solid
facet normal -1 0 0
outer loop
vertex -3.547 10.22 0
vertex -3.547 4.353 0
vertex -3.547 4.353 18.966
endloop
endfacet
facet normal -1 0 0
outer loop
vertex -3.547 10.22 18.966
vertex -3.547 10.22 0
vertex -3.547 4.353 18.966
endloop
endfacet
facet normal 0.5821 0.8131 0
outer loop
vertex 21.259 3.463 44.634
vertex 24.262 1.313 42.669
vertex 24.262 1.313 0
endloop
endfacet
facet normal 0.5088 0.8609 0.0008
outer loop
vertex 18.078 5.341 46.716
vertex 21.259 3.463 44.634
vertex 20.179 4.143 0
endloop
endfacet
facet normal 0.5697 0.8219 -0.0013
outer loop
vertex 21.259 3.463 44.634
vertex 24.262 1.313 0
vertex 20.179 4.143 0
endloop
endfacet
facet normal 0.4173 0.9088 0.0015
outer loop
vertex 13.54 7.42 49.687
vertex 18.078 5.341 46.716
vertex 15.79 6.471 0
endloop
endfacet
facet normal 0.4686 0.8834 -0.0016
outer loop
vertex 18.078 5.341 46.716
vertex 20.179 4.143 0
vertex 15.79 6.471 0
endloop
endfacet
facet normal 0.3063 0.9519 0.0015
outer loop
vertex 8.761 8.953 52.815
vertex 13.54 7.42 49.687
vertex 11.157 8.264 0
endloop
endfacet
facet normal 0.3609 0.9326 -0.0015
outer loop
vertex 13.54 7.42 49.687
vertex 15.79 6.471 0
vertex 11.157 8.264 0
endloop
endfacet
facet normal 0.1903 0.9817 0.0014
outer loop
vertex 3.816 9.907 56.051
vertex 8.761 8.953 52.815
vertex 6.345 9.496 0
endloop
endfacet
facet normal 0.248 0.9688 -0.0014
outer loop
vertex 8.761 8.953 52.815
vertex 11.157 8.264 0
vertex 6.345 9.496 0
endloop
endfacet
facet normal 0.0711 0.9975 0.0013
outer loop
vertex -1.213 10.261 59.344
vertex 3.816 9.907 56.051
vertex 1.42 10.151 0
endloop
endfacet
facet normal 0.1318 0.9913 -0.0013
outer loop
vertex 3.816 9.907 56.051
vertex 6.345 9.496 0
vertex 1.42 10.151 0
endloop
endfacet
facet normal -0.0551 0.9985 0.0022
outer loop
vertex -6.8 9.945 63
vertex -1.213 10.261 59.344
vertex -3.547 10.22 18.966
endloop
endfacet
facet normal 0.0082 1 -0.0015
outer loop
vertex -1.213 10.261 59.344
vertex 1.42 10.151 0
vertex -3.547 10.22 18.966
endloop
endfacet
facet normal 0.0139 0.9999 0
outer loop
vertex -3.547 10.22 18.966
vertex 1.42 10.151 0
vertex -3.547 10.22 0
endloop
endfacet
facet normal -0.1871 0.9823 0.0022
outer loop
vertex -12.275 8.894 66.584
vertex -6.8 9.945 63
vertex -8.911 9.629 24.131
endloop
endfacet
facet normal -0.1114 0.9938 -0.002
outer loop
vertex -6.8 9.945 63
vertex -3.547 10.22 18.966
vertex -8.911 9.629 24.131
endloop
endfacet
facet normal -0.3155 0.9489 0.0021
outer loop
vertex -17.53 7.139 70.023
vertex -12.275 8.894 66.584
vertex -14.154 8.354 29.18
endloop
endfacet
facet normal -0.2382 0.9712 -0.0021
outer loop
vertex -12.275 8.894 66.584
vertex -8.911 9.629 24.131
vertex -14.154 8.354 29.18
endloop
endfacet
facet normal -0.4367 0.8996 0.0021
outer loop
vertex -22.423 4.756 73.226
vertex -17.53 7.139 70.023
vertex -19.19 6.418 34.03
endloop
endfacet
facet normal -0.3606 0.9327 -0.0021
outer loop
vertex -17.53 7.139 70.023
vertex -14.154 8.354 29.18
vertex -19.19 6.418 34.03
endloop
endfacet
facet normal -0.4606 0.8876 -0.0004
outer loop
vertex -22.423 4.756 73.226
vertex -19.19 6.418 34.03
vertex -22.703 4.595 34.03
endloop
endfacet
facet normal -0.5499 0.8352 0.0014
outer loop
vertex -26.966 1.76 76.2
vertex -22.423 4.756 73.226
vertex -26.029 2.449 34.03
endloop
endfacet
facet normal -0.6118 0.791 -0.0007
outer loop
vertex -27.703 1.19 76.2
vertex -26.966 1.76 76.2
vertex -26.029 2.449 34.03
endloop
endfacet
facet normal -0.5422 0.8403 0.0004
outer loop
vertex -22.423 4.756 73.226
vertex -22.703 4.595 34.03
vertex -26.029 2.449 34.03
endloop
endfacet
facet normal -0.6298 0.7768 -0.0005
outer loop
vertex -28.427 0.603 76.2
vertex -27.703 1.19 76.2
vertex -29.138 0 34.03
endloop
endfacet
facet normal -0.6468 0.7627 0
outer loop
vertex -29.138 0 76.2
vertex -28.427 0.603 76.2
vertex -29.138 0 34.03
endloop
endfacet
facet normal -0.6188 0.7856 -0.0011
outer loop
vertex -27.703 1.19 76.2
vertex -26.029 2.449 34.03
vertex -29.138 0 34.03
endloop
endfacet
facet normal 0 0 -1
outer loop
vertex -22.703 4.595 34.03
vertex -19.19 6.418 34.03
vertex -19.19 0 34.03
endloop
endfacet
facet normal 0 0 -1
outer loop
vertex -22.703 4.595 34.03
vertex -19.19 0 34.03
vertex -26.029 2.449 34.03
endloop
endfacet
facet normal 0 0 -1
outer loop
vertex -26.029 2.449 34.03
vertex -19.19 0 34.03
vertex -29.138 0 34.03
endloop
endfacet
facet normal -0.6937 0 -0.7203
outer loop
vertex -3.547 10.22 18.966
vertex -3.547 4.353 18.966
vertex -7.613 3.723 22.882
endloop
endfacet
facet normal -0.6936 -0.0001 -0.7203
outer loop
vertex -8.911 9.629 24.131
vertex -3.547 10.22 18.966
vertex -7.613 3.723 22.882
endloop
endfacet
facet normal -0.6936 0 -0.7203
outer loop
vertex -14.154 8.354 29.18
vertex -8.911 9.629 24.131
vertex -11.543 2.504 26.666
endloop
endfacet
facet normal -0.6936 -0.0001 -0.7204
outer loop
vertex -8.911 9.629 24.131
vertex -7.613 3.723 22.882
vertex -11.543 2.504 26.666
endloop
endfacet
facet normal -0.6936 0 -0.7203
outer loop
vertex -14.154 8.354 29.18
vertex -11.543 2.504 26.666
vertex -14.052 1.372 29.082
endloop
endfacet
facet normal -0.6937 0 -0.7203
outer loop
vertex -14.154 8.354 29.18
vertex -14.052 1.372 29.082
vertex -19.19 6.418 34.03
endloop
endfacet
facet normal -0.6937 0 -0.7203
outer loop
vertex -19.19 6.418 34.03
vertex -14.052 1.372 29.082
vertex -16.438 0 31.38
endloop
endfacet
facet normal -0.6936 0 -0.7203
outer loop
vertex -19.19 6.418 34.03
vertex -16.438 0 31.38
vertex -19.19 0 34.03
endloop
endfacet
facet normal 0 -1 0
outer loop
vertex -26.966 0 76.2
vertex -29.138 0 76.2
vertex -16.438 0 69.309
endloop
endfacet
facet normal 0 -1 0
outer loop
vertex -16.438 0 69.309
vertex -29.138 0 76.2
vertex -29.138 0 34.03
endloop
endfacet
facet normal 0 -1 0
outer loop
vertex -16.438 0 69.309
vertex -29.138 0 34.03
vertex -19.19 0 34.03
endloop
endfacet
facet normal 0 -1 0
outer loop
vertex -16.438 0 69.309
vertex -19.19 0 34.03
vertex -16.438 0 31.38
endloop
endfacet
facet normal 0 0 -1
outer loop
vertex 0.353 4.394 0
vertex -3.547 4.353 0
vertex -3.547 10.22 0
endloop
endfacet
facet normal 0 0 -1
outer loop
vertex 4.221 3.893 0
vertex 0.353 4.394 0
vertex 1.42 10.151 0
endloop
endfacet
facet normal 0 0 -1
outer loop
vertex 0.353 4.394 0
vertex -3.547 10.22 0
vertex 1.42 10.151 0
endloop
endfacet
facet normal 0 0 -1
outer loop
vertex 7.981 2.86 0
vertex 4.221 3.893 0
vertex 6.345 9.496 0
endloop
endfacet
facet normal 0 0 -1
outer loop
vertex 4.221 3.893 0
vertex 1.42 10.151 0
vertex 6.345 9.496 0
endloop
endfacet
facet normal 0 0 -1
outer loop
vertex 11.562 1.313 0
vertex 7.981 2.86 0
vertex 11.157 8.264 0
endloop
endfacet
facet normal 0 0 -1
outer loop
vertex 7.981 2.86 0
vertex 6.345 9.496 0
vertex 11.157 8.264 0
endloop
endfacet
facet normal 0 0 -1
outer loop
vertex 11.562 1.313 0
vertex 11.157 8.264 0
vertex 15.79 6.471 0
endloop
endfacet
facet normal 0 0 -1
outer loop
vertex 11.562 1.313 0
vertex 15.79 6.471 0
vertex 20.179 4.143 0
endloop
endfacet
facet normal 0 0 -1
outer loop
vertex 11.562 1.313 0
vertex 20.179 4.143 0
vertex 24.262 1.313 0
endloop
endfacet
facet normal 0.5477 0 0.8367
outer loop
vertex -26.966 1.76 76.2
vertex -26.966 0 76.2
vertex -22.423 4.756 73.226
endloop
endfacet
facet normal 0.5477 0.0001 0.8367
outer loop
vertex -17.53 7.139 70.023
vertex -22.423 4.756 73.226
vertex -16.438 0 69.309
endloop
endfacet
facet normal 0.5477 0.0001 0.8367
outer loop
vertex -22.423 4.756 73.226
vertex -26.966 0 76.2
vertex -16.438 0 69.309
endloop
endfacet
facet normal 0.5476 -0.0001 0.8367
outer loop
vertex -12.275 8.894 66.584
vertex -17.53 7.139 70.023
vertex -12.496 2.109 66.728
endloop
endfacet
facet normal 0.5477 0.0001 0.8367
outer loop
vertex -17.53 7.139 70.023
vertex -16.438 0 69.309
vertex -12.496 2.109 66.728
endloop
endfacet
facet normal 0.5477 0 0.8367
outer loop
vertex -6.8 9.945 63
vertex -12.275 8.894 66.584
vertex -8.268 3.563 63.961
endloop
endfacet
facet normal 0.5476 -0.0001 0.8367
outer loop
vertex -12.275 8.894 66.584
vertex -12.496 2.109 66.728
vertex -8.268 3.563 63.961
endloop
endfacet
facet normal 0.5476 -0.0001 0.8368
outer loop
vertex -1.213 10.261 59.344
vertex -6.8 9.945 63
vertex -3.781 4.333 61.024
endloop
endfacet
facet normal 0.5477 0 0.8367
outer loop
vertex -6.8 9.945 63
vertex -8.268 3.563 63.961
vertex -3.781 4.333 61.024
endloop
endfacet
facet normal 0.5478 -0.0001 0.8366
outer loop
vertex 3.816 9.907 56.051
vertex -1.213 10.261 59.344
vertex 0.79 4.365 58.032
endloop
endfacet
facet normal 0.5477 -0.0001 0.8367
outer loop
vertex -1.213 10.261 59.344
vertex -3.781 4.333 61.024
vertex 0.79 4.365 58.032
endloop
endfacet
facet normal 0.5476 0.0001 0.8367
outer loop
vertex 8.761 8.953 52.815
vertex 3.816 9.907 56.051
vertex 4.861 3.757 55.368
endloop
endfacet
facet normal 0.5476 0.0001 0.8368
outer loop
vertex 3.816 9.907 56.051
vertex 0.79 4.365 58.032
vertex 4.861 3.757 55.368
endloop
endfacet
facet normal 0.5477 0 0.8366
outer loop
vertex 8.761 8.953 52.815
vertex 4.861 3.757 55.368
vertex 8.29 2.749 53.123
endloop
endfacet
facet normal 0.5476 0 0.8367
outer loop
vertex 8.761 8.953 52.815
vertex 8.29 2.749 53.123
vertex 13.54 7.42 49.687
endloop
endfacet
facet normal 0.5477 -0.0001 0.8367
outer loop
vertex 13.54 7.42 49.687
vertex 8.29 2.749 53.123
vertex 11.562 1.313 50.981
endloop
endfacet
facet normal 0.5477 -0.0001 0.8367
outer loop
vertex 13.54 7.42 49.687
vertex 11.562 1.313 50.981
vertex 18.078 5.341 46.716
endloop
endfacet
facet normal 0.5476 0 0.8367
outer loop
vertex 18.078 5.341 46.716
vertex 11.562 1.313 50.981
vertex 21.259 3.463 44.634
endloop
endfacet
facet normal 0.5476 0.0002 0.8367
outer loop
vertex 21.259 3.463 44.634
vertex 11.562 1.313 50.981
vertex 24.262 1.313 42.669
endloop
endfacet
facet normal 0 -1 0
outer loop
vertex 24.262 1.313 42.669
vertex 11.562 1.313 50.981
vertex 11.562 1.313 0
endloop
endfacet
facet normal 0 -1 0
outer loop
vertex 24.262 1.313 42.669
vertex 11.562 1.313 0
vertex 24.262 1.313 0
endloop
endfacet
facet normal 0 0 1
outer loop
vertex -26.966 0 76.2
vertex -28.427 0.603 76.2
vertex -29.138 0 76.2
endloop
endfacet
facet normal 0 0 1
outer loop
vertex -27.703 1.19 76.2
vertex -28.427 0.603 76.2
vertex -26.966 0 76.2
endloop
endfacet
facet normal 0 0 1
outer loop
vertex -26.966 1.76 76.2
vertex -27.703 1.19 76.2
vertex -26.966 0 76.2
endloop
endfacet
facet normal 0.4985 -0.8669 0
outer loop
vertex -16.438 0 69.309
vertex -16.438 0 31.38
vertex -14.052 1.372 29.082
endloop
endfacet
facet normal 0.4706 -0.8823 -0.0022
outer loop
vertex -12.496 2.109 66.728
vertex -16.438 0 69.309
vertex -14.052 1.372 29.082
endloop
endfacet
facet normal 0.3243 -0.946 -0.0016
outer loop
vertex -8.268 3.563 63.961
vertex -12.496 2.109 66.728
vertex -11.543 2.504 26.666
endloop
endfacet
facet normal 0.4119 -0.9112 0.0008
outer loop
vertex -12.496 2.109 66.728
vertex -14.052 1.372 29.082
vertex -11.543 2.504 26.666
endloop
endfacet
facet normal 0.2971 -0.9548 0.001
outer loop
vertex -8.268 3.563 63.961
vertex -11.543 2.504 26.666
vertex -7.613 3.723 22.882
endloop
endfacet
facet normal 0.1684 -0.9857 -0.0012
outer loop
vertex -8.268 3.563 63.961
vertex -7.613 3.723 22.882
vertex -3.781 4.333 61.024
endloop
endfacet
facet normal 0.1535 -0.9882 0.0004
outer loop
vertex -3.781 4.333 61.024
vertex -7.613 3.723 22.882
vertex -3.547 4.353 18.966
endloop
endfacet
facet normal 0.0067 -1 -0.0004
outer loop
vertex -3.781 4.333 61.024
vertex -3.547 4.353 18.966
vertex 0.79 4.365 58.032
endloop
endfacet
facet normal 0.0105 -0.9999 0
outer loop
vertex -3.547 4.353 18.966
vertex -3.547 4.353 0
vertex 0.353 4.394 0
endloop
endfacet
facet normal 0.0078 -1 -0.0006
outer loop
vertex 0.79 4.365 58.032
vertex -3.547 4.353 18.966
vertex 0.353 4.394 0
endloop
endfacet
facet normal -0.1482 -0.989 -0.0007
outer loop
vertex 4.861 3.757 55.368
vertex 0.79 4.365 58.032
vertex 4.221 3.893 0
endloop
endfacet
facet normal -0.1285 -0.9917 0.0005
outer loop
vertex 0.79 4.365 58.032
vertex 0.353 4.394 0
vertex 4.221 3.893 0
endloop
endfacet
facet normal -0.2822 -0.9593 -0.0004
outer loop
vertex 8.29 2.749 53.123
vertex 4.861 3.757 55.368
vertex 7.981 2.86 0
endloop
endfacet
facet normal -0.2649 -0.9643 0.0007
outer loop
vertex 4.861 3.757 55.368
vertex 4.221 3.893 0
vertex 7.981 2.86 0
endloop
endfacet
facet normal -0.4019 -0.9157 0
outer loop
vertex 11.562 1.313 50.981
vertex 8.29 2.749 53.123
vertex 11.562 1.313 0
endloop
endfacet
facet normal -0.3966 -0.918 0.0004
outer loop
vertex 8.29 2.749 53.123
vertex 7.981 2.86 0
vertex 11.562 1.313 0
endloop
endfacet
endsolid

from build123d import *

# Parameters (mm, degrees)
F1_DEPTH = 76.2
F3_DEPTH = 25
F5_DEPTH = 25


with BuildPart() as f1:
    # F0 (on Top) → F1 (new body)
    with BuildSketch(Plane.XY):
        with BuildLine():
            Line((-29.137894, 0), (-16.437894, 0))
            ThreePointArc((-16.437894, 0), (-2.614066, 4.412701), (11.562106, 1.313299))
            Line((11.562106, 1.313299), (24.262106, 1.313299))
            ThreePointArc((24.262106, 1.313299), (-2.67384, 10.250454), (-29.137894, 0))
        make_face()
    extrude(amount=F1_DEPTH)

    # F2 (on Front) → F3 (cut)
    with BuildSketch(Plane.XZ):
        Polygon((25.847133, 41.631106), (24.586304, 78.813426), (-30.959083, 78.813426), align=None)
    extrude(amount=-F3_DEPTH, mode=Mode.SUBTRACT)

    # F4 (on Front) → F5 (cut)
    with BuildSketch(Plane.XZ):
        Polygon((-34.645859, -3.21119), (-3.547264, -3.21119), (-3.547264, 18.966397), (-19.190293, 34.029976), (-34.645859, 34.029976), align=None)
    extrude(amount=-F5_DEPTH, mode=Mode.SUBTRACT)


solid = f1.part
